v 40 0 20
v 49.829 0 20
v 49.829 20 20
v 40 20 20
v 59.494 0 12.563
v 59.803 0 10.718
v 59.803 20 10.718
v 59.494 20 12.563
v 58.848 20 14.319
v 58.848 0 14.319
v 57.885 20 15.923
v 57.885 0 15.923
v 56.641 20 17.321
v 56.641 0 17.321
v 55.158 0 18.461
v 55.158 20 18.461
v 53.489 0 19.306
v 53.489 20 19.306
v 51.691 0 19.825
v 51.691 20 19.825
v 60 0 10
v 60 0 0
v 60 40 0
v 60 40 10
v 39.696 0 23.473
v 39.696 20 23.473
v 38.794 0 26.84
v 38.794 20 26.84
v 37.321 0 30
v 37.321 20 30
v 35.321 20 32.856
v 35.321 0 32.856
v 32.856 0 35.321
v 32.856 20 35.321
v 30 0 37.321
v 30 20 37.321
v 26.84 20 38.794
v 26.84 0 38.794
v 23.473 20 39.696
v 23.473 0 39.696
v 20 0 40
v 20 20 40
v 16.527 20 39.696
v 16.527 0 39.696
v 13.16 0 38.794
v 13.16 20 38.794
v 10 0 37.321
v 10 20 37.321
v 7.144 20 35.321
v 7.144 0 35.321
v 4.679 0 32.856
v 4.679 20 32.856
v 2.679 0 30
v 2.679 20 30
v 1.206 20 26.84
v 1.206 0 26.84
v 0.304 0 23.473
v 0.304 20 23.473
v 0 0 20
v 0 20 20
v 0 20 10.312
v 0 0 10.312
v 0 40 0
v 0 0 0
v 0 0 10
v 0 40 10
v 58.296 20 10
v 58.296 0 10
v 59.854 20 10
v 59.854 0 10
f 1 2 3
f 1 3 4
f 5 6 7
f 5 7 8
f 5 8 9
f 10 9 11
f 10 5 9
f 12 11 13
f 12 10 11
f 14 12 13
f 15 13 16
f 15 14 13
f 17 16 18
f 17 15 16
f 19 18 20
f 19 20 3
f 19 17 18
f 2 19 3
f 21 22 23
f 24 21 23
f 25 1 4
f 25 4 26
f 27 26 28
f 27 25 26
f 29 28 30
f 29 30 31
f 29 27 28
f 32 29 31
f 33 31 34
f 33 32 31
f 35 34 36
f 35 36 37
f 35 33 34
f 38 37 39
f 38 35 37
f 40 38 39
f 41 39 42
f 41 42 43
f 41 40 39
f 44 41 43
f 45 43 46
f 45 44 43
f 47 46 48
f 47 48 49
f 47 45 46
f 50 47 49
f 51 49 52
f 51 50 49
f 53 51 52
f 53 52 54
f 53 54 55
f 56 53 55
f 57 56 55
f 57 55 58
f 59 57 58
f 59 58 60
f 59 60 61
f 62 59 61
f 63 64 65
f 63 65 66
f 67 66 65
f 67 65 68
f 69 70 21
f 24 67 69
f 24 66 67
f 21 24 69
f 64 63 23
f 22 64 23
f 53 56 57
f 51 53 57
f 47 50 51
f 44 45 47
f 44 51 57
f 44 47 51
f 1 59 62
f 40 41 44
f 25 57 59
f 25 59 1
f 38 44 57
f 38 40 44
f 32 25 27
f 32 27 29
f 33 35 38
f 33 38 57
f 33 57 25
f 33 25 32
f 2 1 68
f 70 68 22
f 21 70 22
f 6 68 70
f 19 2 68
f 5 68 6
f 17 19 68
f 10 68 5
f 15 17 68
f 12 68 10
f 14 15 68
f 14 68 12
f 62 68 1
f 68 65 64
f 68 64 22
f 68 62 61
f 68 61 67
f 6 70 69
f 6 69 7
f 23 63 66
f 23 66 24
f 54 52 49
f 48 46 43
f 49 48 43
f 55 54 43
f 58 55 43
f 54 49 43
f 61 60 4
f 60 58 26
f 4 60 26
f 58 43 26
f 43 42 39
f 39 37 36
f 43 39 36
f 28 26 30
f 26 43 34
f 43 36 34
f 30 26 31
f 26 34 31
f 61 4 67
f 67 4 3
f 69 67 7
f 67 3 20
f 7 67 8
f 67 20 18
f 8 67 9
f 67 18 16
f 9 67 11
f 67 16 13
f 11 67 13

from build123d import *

# Parameters (mm, degrees)
F0_W     = 60
F0_H     = 40
F1_DEPTH = 10
F5_DEPTH = 20


# Not quite as in the source:
# - a feature of the source that left no trace in its solid (it failed there, or was rolled back) is left out


with BuildPart() as f1:
    # F0 (on Top) → F1 (new body)
    with BuildSketch(Plane.XY):
        with Locations((30, 20)):
            Rectangle(F0_W, F0_H)
    extrude(amount=F1_DEPTH)

    # F2 (on Front) → F5 (join)
    with BuildSketch(Plane.XZ):
        with BuildLine():
            Line((49.8285376106, 20), (40, 20))
            ThreePointArc((40, 20), (20, 40), (0, 20))
            Line((0, 20), (0, 10.3115513921))
            Line((0, 10.3115513921), (59.8550215364, 9.9916663021))
            Line((59.8550215364, 9.9916663021), (59.8027205061, 10.7181055402))
            ThreePointArc((59.8027205061, 10.7181055402), (56.6409874121, 17.3205551498), (49.8285376106, 20))
        make_face()
    extrude(amount=-F5_DEPTH)


solid = f1.part
